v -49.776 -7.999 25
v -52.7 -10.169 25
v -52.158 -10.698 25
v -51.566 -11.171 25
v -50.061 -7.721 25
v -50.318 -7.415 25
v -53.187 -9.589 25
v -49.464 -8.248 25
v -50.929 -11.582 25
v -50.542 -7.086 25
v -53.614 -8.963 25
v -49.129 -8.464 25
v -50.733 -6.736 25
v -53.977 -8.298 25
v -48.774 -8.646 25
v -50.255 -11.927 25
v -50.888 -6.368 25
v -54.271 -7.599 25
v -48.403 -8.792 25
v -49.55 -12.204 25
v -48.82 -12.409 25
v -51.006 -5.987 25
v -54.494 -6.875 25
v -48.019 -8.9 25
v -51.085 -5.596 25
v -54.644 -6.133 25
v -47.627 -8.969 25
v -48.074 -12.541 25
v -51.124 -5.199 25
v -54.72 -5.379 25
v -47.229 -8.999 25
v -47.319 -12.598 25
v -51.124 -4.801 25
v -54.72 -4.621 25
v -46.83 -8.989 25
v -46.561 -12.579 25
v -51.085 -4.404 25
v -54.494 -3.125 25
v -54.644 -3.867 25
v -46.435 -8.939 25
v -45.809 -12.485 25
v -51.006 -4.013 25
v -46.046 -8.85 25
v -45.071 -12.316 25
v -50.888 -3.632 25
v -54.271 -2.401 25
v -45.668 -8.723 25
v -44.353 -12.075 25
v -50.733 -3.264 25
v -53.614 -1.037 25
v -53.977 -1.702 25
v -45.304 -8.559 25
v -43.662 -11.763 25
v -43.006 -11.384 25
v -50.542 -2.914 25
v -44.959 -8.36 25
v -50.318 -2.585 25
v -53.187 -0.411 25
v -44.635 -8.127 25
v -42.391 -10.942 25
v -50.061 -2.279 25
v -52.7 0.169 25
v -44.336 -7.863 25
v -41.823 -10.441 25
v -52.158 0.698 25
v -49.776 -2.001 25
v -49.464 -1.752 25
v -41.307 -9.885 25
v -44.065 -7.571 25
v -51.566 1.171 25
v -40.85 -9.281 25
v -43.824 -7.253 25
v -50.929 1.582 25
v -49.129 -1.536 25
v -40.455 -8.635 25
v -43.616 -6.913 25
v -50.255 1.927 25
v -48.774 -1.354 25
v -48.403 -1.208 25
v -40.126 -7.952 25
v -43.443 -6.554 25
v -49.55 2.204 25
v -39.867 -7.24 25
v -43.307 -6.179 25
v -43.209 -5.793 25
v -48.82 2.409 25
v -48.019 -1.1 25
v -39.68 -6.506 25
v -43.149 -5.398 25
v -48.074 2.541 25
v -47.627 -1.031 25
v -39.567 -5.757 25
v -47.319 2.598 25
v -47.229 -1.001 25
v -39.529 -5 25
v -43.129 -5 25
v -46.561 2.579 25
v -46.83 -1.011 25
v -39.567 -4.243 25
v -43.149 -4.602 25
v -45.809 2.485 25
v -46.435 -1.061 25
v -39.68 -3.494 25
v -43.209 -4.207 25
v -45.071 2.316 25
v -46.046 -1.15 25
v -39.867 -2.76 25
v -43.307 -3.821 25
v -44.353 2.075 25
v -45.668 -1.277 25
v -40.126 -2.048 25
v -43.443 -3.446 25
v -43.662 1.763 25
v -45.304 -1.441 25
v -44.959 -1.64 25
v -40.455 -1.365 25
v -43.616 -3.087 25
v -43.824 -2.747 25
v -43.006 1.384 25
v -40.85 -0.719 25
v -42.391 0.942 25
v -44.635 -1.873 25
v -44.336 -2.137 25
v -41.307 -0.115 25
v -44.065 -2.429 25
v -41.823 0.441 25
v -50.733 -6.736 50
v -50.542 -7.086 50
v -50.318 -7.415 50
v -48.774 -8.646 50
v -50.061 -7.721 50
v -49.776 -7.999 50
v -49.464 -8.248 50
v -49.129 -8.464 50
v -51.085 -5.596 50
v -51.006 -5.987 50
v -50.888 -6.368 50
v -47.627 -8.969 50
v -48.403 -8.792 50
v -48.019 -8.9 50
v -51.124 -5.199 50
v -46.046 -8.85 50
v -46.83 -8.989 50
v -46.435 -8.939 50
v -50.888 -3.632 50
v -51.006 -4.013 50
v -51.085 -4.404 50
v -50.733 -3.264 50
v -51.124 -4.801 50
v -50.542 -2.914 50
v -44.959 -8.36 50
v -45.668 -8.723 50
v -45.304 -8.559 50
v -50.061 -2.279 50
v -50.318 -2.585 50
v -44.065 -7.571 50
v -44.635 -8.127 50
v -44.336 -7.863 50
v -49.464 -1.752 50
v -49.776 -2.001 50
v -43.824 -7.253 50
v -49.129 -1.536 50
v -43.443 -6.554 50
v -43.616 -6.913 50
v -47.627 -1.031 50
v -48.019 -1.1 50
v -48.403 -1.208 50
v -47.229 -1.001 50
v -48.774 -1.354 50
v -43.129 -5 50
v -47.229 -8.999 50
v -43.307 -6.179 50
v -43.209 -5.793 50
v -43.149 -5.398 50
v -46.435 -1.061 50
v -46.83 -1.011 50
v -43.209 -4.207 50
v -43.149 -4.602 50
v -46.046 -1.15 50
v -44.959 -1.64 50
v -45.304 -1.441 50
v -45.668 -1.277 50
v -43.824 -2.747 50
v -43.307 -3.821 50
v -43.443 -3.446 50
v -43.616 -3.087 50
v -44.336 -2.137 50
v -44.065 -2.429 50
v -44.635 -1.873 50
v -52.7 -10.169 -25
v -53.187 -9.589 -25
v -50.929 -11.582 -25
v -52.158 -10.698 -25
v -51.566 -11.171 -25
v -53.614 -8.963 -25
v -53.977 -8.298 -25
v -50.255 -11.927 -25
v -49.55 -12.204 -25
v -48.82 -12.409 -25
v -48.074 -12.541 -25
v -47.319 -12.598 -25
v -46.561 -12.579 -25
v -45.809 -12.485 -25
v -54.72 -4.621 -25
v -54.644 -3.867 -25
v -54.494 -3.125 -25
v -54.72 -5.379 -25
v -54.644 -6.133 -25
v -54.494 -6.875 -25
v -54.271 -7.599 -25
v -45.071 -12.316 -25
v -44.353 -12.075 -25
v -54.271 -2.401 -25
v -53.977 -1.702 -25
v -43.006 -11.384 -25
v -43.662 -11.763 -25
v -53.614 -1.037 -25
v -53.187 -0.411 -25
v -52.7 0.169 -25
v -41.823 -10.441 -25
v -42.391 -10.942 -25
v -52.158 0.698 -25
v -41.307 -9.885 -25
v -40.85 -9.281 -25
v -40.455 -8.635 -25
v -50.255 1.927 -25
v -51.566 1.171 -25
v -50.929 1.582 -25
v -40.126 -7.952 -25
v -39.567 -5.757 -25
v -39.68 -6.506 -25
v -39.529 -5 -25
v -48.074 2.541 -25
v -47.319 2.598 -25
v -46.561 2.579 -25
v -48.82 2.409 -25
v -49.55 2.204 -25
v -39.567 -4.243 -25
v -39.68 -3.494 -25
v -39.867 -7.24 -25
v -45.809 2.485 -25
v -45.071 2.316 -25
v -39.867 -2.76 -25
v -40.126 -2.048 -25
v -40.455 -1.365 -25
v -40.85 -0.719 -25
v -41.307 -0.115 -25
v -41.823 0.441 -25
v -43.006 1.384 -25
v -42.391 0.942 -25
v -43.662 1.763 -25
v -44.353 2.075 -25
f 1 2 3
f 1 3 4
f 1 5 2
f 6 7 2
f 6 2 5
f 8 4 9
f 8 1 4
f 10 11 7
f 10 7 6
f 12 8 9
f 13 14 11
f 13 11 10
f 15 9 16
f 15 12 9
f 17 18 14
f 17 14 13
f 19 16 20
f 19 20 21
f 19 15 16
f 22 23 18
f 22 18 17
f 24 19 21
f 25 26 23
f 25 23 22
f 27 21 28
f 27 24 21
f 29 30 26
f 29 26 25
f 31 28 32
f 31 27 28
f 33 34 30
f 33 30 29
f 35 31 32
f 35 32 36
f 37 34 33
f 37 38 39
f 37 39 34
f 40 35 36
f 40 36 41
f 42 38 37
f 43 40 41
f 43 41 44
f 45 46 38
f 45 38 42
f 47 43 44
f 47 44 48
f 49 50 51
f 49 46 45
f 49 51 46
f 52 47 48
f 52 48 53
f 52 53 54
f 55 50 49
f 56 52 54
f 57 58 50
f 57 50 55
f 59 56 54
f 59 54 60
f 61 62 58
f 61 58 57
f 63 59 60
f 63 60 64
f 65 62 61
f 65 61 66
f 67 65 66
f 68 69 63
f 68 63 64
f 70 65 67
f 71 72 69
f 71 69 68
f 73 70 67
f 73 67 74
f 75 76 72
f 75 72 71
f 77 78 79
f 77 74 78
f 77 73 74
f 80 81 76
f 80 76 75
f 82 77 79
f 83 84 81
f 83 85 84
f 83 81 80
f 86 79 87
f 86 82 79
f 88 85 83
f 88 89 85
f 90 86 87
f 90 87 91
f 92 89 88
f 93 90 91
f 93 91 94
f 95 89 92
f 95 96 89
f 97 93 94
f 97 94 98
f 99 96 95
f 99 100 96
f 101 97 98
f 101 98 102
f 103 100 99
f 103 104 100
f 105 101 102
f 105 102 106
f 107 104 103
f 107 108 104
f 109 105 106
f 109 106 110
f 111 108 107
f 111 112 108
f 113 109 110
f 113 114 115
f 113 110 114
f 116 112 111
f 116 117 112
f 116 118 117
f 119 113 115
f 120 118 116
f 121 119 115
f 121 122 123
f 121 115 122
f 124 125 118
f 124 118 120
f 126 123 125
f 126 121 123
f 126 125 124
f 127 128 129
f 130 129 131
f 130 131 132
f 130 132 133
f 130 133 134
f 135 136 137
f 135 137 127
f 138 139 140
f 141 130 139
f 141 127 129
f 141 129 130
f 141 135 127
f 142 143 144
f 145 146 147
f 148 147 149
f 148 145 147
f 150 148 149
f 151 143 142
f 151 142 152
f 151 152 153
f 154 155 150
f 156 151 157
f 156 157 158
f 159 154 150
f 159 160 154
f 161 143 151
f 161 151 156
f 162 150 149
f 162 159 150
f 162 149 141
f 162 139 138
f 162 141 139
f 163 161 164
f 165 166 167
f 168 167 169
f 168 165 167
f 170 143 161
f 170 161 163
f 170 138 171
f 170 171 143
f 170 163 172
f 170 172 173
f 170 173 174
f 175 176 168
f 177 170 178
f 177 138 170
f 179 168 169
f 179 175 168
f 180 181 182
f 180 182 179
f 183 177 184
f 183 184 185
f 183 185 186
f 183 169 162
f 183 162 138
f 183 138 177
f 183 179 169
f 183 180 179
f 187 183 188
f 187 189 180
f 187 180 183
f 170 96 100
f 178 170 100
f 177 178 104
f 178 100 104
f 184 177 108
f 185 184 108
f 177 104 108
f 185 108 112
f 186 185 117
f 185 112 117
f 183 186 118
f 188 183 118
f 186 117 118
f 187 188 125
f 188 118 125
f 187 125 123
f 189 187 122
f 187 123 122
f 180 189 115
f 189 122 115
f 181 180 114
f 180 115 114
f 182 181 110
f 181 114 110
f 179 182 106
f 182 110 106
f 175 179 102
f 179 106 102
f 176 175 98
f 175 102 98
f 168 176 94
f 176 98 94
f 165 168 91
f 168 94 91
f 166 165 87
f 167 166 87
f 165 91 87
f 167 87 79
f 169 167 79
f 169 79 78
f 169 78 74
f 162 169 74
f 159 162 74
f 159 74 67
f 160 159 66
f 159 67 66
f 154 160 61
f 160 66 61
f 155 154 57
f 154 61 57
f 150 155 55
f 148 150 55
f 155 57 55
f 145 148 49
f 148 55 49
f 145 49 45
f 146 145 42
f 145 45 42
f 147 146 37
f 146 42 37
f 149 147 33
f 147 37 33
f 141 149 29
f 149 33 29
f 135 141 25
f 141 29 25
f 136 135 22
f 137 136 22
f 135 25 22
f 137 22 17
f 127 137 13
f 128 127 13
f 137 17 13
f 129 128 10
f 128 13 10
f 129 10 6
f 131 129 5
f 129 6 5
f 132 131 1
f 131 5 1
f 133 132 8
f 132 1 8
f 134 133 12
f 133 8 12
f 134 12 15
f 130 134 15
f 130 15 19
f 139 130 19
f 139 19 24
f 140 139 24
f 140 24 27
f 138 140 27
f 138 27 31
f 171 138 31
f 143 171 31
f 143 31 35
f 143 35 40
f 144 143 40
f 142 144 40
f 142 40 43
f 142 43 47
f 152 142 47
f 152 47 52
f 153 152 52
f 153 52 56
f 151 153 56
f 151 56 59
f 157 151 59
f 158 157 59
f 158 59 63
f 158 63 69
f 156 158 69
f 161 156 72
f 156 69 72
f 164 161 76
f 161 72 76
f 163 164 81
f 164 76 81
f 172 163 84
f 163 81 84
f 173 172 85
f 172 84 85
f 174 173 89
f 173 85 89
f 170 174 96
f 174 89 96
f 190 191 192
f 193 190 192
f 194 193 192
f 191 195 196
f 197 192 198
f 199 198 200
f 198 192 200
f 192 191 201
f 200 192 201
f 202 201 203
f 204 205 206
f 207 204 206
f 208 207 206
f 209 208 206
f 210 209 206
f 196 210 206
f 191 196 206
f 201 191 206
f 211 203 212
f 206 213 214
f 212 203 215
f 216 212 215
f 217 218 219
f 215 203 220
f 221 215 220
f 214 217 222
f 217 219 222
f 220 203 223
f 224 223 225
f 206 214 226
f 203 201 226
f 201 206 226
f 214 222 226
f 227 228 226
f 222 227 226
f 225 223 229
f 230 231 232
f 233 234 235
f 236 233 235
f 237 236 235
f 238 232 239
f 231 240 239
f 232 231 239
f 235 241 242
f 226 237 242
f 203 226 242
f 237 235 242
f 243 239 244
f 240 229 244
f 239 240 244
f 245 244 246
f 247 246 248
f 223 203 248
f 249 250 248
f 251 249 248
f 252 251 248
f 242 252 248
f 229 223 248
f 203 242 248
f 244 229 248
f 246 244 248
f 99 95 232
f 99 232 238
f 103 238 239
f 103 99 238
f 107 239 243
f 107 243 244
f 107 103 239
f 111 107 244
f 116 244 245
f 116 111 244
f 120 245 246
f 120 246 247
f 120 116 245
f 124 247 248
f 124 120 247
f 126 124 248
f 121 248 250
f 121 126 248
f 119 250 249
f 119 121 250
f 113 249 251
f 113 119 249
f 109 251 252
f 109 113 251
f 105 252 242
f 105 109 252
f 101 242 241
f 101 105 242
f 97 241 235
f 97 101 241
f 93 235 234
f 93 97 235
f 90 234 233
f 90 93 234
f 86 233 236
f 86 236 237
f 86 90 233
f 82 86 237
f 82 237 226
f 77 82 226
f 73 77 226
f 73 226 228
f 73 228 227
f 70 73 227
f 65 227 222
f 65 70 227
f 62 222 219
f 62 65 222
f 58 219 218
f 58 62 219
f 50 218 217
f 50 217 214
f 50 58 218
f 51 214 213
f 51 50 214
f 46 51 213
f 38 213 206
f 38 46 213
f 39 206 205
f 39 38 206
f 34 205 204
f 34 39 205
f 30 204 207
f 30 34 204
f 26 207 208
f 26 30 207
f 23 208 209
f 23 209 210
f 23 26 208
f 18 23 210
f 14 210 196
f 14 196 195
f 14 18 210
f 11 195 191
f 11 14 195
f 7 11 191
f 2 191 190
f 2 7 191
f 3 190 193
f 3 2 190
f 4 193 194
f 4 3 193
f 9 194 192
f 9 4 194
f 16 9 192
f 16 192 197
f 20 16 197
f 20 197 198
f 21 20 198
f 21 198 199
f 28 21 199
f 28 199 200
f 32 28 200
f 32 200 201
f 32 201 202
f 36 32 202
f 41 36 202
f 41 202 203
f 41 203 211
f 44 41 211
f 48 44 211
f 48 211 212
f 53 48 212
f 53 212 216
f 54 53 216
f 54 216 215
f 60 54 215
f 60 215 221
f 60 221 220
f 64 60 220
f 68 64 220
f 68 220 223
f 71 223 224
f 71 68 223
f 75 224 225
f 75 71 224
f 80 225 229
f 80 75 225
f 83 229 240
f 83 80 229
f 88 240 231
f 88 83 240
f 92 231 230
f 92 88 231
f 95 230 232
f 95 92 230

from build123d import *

# Parameters (mm, degrees)
F0_R     = 7.6
F0_R_2   = 4
F1_DEPTH = 50
F2_DEPTH = 25


with BuildPart() as f1:
    # F0 (on Top) → F1 (new body)
    with BuildSketch(Plane.XY):
        with Locations((-47.129215, 0)):
            Circle(F0_R)
        with Locations((-47.129215, 0)):
            Circle(F0_R_2, mode=Mode.SUBTRACT)
        with Locations((-47.129215, 0)):
            Circle(F0_R_2)
    extrude(amount=-F1_DEPTH)

    # F0 (on Top) → F2 (join)
    with BuildSketch(Plane.XY):
        with Locations((-47.129215, 0)):
            Circle(F0_R_2)
    extrude(amount=F2_DEPTH)


with BuildPart() as f1_1:
    # F3: moved
    add(f1.part.moved(Location((0, -5, 25))))


solid = f1_1.part
